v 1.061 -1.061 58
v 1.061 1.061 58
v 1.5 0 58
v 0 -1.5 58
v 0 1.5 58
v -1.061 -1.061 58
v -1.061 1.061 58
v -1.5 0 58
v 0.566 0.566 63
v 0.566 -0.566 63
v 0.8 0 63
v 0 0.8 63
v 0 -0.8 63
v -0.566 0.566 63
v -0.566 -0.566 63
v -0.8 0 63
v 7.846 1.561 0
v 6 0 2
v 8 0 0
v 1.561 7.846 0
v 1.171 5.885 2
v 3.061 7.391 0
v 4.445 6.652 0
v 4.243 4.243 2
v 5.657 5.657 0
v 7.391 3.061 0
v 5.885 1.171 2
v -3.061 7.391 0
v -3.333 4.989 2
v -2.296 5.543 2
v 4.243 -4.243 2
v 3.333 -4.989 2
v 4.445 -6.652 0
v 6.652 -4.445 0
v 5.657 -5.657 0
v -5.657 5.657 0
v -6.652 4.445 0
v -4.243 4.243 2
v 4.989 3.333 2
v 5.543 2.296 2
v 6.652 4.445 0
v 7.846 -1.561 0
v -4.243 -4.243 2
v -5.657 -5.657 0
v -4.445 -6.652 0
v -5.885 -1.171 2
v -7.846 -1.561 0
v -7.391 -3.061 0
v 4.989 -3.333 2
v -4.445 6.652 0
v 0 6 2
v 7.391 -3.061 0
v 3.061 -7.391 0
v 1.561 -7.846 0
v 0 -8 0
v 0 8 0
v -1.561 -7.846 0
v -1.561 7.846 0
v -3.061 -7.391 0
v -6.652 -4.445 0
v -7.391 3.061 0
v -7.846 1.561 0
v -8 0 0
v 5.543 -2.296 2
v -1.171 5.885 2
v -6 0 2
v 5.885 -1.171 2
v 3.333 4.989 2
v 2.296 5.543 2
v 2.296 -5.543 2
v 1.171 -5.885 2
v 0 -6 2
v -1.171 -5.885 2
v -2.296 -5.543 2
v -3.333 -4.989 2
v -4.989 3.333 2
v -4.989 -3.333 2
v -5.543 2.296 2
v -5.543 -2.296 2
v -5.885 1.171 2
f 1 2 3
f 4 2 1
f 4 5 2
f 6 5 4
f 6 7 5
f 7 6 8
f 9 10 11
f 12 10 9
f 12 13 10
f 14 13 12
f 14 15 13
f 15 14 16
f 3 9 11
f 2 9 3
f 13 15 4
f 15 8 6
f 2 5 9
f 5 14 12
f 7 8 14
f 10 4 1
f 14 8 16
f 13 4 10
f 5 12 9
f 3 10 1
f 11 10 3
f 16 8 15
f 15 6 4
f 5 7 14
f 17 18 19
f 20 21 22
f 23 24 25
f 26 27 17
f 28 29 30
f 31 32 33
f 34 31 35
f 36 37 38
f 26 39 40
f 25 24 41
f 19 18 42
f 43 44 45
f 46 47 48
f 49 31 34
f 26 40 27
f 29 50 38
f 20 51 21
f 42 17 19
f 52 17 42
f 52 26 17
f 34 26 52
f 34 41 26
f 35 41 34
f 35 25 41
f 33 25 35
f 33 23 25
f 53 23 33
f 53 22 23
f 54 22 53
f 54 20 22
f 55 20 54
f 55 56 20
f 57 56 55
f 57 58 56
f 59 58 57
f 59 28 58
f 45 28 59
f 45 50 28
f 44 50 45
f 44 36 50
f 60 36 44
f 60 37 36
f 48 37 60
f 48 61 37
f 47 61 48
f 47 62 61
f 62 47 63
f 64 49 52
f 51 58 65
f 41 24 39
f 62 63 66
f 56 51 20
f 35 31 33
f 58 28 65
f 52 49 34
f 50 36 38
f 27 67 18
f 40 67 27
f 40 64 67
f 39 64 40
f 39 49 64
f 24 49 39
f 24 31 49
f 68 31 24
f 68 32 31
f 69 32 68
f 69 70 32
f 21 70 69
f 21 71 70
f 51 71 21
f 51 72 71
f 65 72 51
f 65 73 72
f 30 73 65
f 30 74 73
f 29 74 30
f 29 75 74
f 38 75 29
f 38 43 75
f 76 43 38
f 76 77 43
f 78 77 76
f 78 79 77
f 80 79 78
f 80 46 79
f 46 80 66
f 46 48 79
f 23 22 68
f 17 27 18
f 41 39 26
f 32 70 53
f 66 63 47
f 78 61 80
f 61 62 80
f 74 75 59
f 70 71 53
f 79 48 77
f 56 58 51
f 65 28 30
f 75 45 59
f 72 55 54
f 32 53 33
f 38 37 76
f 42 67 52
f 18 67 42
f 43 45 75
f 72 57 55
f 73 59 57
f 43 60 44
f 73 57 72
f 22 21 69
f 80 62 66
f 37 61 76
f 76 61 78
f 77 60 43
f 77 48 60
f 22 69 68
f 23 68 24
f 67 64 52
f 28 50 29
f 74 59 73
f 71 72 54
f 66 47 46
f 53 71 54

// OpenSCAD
// Starfruit - Pineapple Party model definition
// Parameters are parsed by the JS viewer; modules render in OpenSCAD

/* [Model] */
name = "starfruit";
body_type = "star";

/* [Body] */
body_height = 60;
body_radius = 18;
body_color = "0xc8d82e";
body_roughness = 0.35;
body_metalness = 0.05;

/* [Star] */
star_points = 5;

/* [Bumps] */
bump_type = "sphere";
bump_placement = "ridge";
bump_size = 1.5;
bump_rows = 8;
bumps_per_row = 5;
bump_color = "0x9aaa20";
bump_roughness = 0.5;
bump_metalness = 0.05;
bump_scale = [1.2, 1.2, 0.6];
bump_stagger = false;

/* [Crown] */
crown_y = 58;  // BH - 2
leaf_width = 4;
leaf_thickness = 1;
leaf_length = 10;
leaf_color = "0x7a8a18";
leaf_roughness = 0.5;
leaf_metalness = 0.0;
leaf_placement = "crown";
leaf_rings = [[1, 17, 40, 0.5, 0.5, 0.5]];

/* [Stem] */
has_stem = true;
stem_r1 = 0.8;
stem_r2 = 1.5;
stem_height = 5;
stem_color = "0x7a8a18";
stem_y = 60;  // crown_y + 2
stem_tilt = 0;

/* [Base] */
base_r1 = 6;
base_r2 = 8;

/* [Resolution] */
$fn = 64;

// =====================================================
// OpenSCAD rendering
// =====================================================
function star_radius(angle) =
    let(
        a5 = (angle % (360 / star_points)) / (360 / star_points),
        peak = cos(a5 * 360 - 180) * 0.5 + 0.5
    )
    body_radius * (0.55 + peak * 0.45);

module starfruit_body() {
    h_segs = 24;
    a_segs = star_points * 8;

    for (h = [0 : h_segs - 1]) {
        t0 = h / h_segs;
        t1 = (h + 1) / h_segs;
        taper0 = sin(t0 * 180) * 0.75 + 0.25;
        taper1 = sin(t1 * 180) * 0.75 + 0.25;

        for (a = [0 : a_segs - 1]) {
            a0 = a / a_segs * 360;
            a1 = (a + 1) / a_segs * 360;
            r00 = star_radius(a0) * taper0;
            r01 = star_radius(a1) * taper0;
            r10 = star_radius(a0) * taper1;
            r11 = star_radius(a1) * taper1;

            polyhedron(
                points = [
                    [r00*cos(a0), r00*sin(a0), t0*body_height],
                    [r01*cos(a1), r01*sin(a1), t0*body_height],
                    [r10*cos(a0), r10*sin(a0), t1*body_height],
                    [r11*cos(a1), r11*sin(a1), t1*body_height]
                ],
                faces = [[0,2,3,1]]
            );
        }
    }
}

module starfruit() {
    color([0.78, 0.85, 0.18])
    starfruit_body();

    // Stem
    color([0.48, 0.54, 0.09])
    translate([0, 0, body_height - 2])
    cylinder(h = stem_height, r1 = stem_r2, r2 = stem_r1, $fn = 8);

    // Base
    color([0.78, 0.85, 0.18])
    cylinder(h = 2, r1 = base_r2, r2 = base_r1, $fn = 32);
}

starfruit();
